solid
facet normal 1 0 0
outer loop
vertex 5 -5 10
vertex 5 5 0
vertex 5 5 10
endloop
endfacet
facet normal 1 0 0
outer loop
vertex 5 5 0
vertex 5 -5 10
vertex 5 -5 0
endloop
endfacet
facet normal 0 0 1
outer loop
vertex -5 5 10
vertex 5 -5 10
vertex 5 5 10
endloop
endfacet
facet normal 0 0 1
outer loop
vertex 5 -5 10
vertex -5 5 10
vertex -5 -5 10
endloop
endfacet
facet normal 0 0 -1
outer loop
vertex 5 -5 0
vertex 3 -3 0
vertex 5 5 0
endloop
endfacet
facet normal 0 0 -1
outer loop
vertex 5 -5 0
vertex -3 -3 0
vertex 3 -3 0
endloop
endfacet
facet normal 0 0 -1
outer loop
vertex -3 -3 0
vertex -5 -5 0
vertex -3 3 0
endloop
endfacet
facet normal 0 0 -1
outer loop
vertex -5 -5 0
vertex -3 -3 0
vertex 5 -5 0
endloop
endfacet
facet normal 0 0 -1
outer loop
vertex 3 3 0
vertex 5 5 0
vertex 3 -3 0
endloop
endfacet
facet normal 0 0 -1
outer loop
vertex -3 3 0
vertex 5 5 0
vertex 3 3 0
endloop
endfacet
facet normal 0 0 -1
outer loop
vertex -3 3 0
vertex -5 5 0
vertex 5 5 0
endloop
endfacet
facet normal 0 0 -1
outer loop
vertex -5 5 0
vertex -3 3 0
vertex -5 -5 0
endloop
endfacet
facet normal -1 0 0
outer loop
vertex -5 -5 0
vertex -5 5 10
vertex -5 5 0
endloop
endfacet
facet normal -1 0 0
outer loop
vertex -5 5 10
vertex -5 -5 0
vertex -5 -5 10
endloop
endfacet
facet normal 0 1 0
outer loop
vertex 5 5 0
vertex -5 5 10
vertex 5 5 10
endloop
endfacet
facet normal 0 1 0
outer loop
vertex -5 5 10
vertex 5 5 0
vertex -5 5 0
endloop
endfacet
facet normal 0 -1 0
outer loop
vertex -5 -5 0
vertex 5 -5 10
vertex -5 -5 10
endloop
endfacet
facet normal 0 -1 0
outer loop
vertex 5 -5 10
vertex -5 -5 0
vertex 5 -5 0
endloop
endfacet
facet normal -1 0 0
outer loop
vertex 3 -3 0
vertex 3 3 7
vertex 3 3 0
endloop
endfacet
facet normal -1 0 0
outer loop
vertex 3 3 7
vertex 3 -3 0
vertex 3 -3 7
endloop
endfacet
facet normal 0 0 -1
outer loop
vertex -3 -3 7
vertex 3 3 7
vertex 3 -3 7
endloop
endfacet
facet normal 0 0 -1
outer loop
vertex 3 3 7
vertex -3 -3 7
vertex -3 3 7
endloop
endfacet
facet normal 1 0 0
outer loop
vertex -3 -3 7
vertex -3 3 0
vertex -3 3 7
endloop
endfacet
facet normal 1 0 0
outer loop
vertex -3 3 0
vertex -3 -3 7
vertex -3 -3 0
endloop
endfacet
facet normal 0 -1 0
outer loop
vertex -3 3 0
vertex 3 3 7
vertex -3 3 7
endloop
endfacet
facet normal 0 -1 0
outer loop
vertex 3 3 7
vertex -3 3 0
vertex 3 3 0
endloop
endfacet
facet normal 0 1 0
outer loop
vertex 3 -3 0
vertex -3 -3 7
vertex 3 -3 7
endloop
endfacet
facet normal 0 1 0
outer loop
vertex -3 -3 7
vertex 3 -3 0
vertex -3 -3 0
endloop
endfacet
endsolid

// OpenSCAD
difference() {
    // add
    translate([0,0,5]) {
        cube(10, center=true);
    }

    // sub
    cube([6,6,14], center=true);
}
